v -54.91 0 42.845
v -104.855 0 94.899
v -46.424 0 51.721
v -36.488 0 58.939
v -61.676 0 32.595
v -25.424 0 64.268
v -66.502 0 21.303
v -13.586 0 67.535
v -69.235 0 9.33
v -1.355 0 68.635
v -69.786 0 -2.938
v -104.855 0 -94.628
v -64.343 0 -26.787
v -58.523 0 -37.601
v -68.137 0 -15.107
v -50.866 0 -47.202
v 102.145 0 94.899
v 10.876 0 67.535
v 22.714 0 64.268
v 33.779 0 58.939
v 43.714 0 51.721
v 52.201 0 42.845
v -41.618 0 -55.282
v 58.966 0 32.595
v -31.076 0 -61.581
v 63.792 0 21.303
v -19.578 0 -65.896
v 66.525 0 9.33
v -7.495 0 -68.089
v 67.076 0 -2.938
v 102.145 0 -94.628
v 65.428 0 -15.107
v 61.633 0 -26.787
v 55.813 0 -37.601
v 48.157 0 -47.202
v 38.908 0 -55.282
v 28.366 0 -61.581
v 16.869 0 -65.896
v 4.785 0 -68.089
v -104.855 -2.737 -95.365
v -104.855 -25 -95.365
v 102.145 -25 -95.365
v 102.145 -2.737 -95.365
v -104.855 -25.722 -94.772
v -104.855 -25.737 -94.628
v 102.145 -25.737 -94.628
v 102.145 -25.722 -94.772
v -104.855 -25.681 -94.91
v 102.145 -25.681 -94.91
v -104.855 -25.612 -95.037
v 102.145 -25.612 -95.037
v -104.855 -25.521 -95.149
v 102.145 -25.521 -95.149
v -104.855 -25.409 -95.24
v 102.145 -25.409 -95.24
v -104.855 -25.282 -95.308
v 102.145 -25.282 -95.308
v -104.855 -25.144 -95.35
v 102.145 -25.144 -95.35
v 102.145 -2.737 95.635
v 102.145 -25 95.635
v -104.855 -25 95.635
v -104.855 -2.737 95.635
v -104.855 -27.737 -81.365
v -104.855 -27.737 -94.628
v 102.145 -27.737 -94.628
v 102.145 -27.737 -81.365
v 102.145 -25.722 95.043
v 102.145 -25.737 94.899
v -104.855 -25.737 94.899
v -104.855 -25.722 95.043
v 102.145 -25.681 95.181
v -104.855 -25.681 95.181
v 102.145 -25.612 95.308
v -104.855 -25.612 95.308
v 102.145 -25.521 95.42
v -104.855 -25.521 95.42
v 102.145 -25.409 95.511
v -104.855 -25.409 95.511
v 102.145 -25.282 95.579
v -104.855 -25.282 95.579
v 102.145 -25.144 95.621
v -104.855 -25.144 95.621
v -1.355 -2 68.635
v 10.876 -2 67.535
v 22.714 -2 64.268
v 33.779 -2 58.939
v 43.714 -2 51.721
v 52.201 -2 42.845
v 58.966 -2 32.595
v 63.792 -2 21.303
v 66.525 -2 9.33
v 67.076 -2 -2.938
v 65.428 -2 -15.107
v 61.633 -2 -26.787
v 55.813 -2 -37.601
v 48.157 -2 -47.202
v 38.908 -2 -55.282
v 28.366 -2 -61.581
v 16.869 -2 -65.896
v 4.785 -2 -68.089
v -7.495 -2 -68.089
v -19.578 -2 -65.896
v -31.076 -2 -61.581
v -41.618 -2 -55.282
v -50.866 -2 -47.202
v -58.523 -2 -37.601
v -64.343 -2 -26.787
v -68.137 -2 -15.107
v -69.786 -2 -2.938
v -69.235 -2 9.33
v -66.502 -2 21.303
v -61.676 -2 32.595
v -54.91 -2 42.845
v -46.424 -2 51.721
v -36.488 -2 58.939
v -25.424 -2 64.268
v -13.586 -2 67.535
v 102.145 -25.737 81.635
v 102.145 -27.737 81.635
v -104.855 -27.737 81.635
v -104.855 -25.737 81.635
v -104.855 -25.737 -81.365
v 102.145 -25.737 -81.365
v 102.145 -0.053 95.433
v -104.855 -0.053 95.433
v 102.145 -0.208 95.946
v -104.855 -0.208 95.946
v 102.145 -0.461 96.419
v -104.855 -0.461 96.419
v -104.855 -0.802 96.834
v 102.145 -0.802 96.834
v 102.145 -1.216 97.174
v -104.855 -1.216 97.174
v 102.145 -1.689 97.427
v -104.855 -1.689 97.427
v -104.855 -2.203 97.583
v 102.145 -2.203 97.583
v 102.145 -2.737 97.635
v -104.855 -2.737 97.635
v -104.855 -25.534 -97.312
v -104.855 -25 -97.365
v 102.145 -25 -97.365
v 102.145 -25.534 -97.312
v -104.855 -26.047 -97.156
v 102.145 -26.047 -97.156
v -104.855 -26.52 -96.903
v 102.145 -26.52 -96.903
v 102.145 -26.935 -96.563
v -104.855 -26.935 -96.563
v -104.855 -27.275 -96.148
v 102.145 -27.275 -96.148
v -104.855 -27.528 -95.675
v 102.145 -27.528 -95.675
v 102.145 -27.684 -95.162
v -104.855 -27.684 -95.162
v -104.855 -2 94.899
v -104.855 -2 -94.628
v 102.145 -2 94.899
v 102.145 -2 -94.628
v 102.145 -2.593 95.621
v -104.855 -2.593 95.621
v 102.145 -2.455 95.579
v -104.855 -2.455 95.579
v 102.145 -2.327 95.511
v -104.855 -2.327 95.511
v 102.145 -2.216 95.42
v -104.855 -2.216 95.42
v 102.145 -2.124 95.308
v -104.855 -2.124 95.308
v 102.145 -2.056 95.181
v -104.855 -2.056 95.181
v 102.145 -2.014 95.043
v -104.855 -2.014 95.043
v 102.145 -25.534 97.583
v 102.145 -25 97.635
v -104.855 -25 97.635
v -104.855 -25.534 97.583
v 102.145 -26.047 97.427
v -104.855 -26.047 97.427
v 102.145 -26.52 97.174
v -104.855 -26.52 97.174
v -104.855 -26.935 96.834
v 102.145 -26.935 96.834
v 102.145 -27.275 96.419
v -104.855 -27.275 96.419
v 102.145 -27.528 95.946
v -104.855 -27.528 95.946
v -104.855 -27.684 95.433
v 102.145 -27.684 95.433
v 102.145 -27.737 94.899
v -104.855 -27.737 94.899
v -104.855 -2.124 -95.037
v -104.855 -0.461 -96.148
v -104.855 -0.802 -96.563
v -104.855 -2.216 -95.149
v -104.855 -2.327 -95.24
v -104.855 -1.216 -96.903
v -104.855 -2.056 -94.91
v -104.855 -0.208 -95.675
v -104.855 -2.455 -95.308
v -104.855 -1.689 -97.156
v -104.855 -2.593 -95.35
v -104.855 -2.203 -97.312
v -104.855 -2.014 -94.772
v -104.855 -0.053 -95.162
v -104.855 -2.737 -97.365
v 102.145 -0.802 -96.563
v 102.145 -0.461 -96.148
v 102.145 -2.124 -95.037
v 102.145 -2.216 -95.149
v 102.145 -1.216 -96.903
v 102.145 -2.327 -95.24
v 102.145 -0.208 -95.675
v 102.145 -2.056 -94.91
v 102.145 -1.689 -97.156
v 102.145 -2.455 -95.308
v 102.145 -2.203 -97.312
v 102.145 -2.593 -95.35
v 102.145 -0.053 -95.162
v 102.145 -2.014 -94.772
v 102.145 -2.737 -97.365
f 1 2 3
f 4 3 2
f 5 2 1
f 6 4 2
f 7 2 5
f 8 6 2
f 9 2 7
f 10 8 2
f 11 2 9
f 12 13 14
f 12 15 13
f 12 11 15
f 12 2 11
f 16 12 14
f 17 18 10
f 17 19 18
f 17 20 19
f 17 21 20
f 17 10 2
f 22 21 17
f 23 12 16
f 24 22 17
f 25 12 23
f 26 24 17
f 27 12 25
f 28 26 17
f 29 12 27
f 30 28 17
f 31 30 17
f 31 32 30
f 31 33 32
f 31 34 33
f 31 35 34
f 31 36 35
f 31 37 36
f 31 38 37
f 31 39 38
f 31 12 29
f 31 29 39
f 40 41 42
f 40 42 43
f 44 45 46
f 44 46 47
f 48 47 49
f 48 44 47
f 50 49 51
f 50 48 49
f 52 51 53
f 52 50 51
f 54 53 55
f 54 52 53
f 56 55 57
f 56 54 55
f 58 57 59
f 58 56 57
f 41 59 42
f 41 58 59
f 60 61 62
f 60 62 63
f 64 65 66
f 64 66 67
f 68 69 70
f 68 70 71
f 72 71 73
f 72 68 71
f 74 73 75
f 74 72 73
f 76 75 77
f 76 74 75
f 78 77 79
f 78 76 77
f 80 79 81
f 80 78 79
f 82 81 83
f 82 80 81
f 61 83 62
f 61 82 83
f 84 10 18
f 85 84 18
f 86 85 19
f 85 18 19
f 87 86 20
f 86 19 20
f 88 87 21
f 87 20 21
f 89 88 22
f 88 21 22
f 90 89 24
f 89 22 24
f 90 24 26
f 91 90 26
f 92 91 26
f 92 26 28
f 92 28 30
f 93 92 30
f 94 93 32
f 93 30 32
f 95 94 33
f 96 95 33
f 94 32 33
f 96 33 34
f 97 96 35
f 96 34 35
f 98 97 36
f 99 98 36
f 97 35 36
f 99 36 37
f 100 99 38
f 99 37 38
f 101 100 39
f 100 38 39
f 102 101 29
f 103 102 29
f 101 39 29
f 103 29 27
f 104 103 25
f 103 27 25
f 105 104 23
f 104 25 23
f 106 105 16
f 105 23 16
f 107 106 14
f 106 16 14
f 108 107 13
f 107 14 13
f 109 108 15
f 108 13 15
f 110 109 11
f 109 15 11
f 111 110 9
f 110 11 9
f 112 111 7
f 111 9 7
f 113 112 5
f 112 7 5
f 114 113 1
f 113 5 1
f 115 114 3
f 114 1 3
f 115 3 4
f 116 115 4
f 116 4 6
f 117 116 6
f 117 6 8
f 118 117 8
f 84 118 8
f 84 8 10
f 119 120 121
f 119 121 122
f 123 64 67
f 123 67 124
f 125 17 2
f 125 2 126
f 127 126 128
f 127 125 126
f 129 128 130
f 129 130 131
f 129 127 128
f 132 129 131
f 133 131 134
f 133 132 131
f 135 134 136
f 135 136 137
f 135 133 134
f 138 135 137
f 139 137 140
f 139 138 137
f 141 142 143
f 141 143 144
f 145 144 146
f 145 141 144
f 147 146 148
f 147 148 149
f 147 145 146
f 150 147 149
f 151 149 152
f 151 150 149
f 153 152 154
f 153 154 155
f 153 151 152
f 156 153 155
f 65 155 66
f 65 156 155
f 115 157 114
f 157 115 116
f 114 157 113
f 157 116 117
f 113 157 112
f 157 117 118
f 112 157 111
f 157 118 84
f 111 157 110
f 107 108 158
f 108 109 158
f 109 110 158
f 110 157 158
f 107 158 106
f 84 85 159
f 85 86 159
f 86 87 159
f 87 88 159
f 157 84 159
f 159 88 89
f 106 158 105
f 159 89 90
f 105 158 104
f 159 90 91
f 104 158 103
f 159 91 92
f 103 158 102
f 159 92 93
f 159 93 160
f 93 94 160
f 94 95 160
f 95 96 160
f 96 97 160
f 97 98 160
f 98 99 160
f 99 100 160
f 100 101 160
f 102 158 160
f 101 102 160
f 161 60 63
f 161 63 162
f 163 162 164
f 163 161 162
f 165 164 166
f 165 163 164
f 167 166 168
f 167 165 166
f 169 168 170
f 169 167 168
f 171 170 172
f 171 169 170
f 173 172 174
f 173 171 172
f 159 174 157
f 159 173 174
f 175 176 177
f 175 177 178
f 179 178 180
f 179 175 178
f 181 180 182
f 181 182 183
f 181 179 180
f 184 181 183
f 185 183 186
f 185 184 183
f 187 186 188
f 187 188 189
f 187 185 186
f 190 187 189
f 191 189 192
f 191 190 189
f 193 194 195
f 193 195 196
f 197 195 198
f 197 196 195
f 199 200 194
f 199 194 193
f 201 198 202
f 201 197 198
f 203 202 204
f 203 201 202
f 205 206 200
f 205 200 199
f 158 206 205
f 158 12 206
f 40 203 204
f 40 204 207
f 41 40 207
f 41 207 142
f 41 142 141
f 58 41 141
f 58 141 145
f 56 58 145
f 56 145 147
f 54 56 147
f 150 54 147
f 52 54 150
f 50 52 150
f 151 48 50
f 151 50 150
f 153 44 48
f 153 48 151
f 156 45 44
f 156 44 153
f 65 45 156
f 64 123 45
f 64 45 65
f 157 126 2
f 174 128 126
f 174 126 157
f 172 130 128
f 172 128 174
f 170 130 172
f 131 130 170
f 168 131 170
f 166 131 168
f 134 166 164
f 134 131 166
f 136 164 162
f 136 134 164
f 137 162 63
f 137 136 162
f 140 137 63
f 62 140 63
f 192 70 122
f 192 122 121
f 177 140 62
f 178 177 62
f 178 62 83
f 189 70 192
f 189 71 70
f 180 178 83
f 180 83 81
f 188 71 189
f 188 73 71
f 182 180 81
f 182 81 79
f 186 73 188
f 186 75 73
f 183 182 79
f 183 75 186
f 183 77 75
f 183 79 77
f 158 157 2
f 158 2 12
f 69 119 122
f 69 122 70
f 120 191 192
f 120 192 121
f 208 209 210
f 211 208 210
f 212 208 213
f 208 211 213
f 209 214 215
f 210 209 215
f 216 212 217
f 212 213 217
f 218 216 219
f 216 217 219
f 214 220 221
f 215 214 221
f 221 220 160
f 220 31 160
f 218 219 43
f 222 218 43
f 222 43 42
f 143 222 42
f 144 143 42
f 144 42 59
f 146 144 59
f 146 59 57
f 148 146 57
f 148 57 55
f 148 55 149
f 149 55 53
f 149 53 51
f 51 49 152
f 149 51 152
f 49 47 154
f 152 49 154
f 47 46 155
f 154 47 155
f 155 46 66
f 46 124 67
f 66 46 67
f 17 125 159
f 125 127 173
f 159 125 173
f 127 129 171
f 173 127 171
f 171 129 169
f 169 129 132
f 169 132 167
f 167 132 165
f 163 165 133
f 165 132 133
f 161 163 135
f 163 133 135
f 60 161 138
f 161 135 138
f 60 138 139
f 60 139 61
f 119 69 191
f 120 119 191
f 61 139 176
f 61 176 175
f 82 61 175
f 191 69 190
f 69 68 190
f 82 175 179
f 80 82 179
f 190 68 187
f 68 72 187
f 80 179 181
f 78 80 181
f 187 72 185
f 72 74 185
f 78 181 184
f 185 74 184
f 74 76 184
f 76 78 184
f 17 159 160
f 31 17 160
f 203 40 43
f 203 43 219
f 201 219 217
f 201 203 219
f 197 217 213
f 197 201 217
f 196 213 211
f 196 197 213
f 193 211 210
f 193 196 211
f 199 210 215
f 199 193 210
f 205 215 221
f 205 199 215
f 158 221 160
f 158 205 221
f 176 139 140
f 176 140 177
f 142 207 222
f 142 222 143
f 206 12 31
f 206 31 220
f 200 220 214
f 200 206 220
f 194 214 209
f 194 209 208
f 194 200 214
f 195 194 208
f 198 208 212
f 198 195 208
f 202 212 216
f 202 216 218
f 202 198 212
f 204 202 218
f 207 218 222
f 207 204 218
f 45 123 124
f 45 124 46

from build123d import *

# Parameters (mm, degrees)
SKETCH3_W                      = 207
SKETCH3_H                      = 195
BASE_FLANGE1_DEPTH             = 2
EDGE_FLANGE1_STRIP_W           = 9.4732
EDGE_FLANGE1_STRIP_H           = 2
EDGE_FLANGE1_STRIP_CUT_DEPTH   = 207
EDGE_FLANGE1_STRIP_2_W         = 9.4732
EDGE_FLANGE1_STRIP_2_H         = 2
EDGE_FLANGE1_STRIP_CUT_2_DEPTH = 207
EDGE_FLANGE1_DEPTH             = 207
EDGE_FLANGE1_BEND_DEPTH        = 207
SKETCH14_R                     = 68.5
CUT_EXTRUDE1_DEPTH             = 2
EDGE_FLANGE2_DEPTH             = 207
EDGE_FLANGE2_BEND_DEPTH        = 207


# Sheet-metal steps are written as plain solids
with BuildPart() as part:
    # Sketch3 → Base-Flange1 (new body)
    with BuildSketch(Plane(origin=(0, 0, 0), x_dir=(1, 0, 0), z_dir=(0, 1, 0))):
        with Locations((-1.354892482, -0.135489248)):
            Rectangle(SKETCH3_W, SKETCH3_H)
    extrude(amount=-BASE_FLANGE1_DEPTH)

    # Edge-Flange1 strip (across the edge) → Edge-Flange1 strip cut (cut)
    with BuildSketch(Plane(origin=(102.145107518, -2, 97.635489248), x_dir=(0, 0, -1), z_dir=(-1, 0, 0))):
        with Locations((-2, -1)):
            Rectangle(EDGE_FLANGE1_STRIP_W, EDGE_FLANGE1_STRIP_H)
    extrude(amount=EDGE_FLANGE1_STRIP_CUT_DEPTH, mode=Mode.SUBTRACT)

    # Edge-Flange1 strip 2 (across the edge) → Edge-Flange1 strip cut 2 (cut)
    with BuildSketch(Plane(origin=(-104.854892482, -2, -97.364510752), x_dir=(0, 0, 1), z_dir=(1, 0, 0))):
        with Locations((-2, -1)):
            Rectangle(EDGE_FLANGE1_STRIP_2_W, EDGE_FLANGE1_STRIP_2_H)
    extrude(amount=EDGE_FLANGE1_STRIP_CUT_2_DEPTH, mode=Mode.SUBTRACT)

    # Edge-Flange1 section (across the edge) → Edge-Flange1 (add)
    with BuildSketch(Plane(origin=(102.145107518, -2, 97.635489248), x_dir=(0, 0, -1), z_dir=(-1, 0, 0))):
        with BuildLine():
            Line((0, 0.7366), (0, 23))
            Line((0, 23), (2, 23))
            Line((2, 23), (2, 0.7366))
            ThreePointArc((2, 0.7366), (2.215745145, 0.215745145), (2.7366, 0))
            Line((2.7366, 0), (2.7366, -2))
            ThreePointArc((2.7366, -2), (0.801531583, -1.198468417), (0, 0.7366))
        make_face()
    extrude(amount=EDGE_FLANGE1_DEPTH)

    # Edge-Flange1 section 2 (across the edge) → Edge-Flange1 bend (add)
    with BuildSketch(Plane(origin=(-104.854892482, -2, -97.364510752), x_dir=(0, 0, 1), z_dir=(1, 0, 0))):
        with BuildLine():
            Line((0, 0.7366), (0, 23))
            Line((0, 23), (2, 23))
            Line((2, 23), (2, 0.7366))
            ThreePointArc((2, 0.7366), (2.215745145, 0.215745145), (2.7366, 0))
            Line((2.7366, 0), (2.7366, -2))
            ThreePointArc((2.7366, -2), (0.801531583, -1.198468417), (0, 0.7366))
        make_face()
    extrude(amount=EDGE_FLANGE1_BEND_DEPTH)

    # Sketch14 → Cut-Extrude1 (cut)
    with BuildSketch(Plane(origin=(0, 0, 0), x_dir=(1, 0, 0), z_dir=(0, 1, 0))):
        with Locations(Location((-1.354892482, -0.135489248, 0), (0, 0, 270))):
            Circle(SKETCH14_R)
    extrude(amount=-CUT_EXTRUDE1_DEPTH, mode=Mode.SUBTRACT)

    # Edge-Flange2 section (across the edge) → Edge-Flange2 (add)
    with BuildSketch(Plane(origin=(102.145107518, -25.7366, 95.635489248), x_dir=(0, 1, 0), z_dir=(-1, 0, 0))):
        with BuildLine():
            Line((-2, 0.7366), (-2, 14))
            Line((-2, 14), (0, 14))
            Line((0, 14), (0, 0.7366))
            ThreePointArc((0, 0.7366), (0.215745145, 0.215745145), (0.7366, 0))
            Line((0.7366, 0), (0.7366, -2))
            ThreePointArc((0.7366, -2), (-1.198468417, -1.198468417), (-2, 0.7366))
        make_face()
    extrude(amount=EDGE_FLANGE2_DEPTH)

    # Edge-Flange2 section 2 (across the edge) → Edge-Flange2 bend (add)
    with BuildSketch(Plane(origin=(-104.854892482, -25.7366, -95.364510752), x_dir=(0, 1, 0), z_dir=(1, 0, 0))):
        with BuildLine():
            Line((-2, 0.7366), (-2, 14))
            Line((-2, 14), (0, 14))
            Line((0, 14), (0, 0.7366))
            ThreePointArc((0, 0.7366), (0.215745145, 0.215745145), (0.7366, 0))
            Line((0.7366, 0), (0.7366, -2))
            ThreePointArc((0.7366, -2), (-1.198468417, -1.198468417), (-2, 0.7366))
        make_face()
    extrude(amount=EDGE_FLANGE2_BEND_DEPTH)


solid = part.part
